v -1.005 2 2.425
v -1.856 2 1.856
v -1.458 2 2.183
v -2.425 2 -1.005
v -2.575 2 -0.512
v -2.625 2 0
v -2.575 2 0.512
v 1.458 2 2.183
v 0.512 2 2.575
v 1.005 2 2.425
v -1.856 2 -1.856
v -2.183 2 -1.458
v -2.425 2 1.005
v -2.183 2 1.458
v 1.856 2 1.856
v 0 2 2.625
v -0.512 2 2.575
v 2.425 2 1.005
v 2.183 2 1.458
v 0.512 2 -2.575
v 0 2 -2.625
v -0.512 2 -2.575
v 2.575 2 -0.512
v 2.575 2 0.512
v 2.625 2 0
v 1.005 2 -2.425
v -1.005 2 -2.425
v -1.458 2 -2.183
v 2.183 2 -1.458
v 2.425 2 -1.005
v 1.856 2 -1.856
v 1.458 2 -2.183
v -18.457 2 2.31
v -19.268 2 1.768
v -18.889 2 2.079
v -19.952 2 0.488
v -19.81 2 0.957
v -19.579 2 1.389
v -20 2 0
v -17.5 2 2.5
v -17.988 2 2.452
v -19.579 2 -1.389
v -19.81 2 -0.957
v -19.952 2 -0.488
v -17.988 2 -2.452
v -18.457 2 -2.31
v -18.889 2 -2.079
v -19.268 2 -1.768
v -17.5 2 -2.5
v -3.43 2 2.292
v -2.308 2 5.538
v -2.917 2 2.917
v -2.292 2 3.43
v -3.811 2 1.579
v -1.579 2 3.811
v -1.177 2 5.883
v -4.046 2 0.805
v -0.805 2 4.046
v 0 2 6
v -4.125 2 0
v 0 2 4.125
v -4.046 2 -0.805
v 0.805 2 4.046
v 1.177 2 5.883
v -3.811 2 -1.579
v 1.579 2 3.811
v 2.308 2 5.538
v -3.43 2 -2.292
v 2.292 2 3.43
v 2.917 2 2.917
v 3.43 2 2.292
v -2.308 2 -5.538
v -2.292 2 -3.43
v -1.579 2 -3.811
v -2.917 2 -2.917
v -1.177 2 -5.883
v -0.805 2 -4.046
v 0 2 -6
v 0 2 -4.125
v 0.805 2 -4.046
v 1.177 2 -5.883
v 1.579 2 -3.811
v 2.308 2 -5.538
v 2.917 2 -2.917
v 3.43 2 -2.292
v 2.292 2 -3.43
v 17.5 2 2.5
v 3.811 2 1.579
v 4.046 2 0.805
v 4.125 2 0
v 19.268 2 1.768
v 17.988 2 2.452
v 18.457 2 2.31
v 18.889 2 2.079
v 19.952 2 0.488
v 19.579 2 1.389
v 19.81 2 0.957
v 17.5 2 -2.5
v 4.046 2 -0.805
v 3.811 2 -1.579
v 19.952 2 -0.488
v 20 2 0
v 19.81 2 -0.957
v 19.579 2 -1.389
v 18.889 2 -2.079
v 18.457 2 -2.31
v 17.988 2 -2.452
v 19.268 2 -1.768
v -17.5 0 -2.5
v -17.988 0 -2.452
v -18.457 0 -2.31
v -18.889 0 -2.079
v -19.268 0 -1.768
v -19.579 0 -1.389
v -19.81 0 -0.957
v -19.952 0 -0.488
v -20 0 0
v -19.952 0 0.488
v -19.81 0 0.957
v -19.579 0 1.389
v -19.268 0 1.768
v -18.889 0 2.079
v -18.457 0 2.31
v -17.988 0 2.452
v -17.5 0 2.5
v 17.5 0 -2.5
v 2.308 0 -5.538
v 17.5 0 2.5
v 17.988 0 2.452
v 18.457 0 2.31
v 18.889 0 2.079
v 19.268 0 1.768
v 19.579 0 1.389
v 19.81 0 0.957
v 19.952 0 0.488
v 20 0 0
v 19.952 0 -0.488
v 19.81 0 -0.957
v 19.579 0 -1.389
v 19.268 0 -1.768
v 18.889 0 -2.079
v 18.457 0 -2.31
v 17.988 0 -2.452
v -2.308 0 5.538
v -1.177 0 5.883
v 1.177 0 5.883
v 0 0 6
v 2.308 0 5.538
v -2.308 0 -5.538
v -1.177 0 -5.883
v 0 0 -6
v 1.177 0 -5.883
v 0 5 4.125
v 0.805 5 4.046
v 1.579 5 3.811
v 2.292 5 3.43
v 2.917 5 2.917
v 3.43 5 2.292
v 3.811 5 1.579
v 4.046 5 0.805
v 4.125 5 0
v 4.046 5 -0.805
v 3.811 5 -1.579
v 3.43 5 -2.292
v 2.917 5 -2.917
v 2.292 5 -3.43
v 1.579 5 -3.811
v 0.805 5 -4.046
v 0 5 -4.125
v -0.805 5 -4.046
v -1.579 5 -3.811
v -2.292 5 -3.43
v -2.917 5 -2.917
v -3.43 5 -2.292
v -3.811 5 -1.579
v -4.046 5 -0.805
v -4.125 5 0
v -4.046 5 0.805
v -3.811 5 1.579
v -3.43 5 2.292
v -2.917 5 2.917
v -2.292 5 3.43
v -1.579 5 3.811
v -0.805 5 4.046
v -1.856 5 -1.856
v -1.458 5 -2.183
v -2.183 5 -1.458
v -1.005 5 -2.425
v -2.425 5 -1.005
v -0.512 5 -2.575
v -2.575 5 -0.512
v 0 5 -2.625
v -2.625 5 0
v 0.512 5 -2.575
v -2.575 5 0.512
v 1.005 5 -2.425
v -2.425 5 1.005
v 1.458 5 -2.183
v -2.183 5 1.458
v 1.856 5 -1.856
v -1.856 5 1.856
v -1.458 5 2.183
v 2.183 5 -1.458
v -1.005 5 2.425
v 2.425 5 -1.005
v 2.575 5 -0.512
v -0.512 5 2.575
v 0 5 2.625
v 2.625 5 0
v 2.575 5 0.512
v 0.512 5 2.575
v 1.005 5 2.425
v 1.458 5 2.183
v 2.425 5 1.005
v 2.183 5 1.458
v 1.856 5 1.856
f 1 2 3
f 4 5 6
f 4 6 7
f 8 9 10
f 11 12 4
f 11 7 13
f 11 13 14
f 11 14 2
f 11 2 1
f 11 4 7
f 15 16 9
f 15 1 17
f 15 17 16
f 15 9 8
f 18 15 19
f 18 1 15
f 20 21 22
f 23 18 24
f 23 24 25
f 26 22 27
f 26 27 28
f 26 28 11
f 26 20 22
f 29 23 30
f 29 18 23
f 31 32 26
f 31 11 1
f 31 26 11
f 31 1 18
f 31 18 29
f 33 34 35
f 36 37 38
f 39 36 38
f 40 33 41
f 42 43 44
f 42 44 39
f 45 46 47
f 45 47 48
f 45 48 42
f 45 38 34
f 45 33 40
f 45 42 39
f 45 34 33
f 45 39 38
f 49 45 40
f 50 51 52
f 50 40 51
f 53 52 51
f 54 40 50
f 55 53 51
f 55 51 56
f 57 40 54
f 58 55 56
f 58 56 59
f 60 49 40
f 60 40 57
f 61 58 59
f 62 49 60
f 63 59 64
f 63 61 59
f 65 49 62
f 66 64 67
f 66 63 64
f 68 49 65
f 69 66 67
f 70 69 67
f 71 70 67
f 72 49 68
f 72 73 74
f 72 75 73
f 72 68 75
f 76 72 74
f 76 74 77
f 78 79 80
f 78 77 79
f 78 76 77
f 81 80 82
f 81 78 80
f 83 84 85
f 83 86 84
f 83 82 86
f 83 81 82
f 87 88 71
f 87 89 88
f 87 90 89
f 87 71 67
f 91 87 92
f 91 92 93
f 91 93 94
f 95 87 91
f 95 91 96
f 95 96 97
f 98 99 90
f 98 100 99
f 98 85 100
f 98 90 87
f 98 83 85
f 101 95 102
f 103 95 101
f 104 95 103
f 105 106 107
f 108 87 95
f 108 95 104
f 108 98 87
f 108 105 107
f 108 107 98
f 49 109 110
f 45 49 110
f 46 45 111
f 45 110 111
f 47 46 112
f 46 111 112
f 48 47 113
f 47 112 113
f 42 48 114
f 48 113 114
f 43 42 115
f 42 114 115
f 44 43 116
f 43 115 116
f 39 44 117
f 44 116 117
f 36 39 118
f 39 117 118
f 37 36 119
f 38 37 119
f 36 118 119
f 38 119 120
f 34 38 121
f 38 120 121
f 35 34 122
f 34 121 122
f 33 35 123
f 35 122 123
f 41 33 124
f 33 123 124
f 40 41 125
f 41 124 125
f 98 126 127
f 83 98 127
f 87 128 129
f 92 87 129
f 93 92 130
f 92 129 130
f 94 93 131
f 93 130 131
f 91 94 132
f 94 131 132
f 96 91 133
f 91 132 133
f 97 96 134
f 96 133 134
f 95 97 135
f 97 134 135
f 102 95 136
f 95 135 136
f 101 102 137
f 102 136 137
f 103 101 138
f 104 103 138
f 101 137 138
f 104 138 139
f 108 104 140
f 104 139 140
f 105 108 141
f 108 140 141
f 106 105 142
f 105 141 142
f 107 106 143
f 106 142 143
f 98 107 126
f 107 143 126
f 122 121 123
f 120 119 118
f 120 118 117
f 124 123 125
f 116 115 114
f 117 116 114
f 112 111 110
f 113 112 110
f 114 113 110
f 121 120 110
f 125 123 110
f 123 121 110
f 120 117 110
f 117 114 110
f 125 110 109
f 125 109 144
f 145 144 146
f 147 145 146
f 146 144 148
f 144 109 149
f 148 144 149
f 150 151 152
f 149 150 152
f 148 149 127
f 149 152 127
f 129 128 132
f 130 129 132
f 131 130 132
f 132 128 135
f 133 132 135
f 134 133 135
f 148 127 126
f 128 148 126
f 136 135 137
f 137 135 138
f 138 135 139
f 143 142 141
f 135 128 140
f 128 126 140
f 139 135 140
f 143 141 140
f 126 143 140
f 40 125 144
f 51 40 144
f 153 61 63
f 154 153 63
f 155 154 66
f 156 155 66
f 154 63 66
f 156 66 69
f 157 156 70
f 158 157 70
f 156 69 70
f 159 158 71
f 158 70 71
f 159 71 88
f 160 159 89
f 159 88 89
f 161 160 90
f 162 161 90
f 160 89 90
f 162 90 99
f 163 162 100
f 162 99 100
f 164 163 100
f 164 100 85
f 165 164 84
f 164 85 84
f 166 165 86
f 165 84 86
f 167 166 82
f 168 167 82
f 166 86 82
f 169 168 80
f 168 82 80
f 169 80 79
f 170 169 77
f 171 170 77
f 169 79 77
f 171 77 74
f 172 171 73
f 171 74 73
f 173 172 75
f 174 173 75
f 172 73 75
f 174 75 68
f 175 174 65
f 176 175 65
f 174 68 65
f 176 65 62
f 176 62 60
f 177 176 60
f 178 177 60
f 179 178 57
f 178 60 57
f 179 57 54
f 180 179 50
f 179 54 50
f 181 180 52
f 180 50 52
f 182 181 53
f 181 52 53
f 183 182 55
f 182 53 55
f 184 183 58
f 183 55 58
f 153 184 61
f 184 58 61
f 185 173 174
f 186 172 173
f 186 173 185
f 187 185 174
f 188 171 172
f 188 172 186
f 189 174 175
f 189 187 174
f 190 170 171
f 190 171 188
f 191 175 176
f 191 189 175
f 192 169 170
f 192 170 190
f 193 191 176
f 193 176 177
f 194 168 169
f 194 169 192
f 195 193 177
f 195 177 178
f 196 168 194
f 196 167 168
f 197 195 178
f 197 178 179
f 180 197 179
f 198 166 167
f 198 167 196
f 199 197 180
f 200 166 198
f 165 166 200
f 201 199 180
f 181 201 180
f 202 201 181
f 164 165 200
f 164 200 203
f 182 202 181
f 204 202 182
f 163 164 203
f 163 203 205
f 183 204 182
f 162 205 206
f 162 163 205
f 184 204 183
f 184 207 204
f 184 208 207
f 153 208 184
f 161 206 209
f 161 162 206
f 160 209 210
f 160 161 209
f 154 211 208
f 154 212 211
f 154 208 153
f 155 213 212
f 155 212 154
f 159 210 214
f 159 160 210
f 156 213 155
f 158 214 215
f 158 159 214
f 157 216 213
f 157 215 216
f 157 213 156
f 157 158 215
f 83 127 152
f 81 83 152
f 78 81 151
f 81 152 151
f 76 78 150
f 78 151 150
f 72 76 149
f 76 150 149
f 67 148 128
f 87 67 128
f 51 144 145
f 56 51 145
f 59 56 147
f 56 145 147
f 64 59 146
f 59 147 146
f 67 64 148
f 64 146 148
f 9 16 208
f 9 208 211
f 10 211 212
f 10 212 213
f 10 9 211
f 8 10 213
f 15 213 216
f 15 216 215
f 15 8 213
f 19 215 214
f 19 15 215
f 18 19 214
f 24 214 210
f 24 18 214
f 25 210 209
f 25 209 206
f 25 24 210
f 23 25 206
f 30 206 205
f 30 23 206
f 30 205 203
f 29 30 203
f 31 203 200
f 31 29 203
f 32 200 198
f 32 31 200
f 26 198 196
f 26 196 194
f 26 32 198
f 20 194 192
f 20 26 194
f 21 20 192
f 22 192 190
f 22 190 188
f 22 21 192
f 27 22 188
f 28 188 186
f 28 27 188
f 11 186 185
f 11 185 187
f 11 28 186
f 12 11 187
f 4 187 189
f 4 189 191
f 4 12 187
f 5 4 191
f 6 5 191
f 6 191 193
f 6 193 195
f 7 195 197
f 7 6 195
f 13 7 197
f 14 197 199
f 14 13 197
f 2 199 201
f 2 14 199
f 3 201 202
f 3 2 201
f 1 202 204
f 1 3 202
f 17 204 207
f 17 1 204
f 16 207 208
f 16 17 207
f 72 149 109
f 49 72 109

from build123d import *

# Parameters (mm, degrees)
BOSS_EXTRUDE1_DEPTH = 2
SKETCH2_R           = 4.125
SKETCH2_R_2         = 2.625
BOSS_EXTRUDE2_DEPTH = 3


with BuildPart() as part:
    # Sketch1 → Boss-Extrude1 (new body)
    with BuildSketch(Plane(origin=(0, 0, 0), x_dir=(1, 0, 0), z_dir=(0, 1, 0))):
        with BuildLine():
            Line((17.5, 2.5), (2.307692308, 5.538461538))
            ThreePointArc((2.307692308, 5.538461538), (0, 6), (-2.307692308, 5.538461538))
            Line((-2.307692308, 5.538461538), (-17.5, 2.5))
            ThreePointArc((-17.5, 2.5), (-20, 0), (-17.5, -2.5))
            Line((-17.5, -2.5), (-2.307692308, -5.538461538))
            ThreePointArc((-2.307692308, -5.538461538), (0, -6), (2.307692308, -5.538461538))
            Line((2.307692308, -5.538461538), (17.5, -2.5))
            ThreePointArc((17.5, -2.5), (20, 0), (17.5, 2.5))
        make_face()
    extrude(amount=BOSS_EXTRUDE1_DEPTH)

    # Sketch2 → Boss-Extrude2 (add)
    with BuildSketch(Plane(origin=(0, 2, 0), x_dir=(1, 0, 0), z_dir=(0, 1, 0))):
        with Locations(Location((0, 0, 0), (0, 0, 270))):
            Circle(SKETCH2_R)
        with Locations(Location((0, 0, 0), (0, 0, 270))):
            Circle(SKETCH2_R_2, mode=Mode.SUBTRACT)
    extrude(amount=BOSS_EXTRUDE2_DEPTH)


solid = part.part
